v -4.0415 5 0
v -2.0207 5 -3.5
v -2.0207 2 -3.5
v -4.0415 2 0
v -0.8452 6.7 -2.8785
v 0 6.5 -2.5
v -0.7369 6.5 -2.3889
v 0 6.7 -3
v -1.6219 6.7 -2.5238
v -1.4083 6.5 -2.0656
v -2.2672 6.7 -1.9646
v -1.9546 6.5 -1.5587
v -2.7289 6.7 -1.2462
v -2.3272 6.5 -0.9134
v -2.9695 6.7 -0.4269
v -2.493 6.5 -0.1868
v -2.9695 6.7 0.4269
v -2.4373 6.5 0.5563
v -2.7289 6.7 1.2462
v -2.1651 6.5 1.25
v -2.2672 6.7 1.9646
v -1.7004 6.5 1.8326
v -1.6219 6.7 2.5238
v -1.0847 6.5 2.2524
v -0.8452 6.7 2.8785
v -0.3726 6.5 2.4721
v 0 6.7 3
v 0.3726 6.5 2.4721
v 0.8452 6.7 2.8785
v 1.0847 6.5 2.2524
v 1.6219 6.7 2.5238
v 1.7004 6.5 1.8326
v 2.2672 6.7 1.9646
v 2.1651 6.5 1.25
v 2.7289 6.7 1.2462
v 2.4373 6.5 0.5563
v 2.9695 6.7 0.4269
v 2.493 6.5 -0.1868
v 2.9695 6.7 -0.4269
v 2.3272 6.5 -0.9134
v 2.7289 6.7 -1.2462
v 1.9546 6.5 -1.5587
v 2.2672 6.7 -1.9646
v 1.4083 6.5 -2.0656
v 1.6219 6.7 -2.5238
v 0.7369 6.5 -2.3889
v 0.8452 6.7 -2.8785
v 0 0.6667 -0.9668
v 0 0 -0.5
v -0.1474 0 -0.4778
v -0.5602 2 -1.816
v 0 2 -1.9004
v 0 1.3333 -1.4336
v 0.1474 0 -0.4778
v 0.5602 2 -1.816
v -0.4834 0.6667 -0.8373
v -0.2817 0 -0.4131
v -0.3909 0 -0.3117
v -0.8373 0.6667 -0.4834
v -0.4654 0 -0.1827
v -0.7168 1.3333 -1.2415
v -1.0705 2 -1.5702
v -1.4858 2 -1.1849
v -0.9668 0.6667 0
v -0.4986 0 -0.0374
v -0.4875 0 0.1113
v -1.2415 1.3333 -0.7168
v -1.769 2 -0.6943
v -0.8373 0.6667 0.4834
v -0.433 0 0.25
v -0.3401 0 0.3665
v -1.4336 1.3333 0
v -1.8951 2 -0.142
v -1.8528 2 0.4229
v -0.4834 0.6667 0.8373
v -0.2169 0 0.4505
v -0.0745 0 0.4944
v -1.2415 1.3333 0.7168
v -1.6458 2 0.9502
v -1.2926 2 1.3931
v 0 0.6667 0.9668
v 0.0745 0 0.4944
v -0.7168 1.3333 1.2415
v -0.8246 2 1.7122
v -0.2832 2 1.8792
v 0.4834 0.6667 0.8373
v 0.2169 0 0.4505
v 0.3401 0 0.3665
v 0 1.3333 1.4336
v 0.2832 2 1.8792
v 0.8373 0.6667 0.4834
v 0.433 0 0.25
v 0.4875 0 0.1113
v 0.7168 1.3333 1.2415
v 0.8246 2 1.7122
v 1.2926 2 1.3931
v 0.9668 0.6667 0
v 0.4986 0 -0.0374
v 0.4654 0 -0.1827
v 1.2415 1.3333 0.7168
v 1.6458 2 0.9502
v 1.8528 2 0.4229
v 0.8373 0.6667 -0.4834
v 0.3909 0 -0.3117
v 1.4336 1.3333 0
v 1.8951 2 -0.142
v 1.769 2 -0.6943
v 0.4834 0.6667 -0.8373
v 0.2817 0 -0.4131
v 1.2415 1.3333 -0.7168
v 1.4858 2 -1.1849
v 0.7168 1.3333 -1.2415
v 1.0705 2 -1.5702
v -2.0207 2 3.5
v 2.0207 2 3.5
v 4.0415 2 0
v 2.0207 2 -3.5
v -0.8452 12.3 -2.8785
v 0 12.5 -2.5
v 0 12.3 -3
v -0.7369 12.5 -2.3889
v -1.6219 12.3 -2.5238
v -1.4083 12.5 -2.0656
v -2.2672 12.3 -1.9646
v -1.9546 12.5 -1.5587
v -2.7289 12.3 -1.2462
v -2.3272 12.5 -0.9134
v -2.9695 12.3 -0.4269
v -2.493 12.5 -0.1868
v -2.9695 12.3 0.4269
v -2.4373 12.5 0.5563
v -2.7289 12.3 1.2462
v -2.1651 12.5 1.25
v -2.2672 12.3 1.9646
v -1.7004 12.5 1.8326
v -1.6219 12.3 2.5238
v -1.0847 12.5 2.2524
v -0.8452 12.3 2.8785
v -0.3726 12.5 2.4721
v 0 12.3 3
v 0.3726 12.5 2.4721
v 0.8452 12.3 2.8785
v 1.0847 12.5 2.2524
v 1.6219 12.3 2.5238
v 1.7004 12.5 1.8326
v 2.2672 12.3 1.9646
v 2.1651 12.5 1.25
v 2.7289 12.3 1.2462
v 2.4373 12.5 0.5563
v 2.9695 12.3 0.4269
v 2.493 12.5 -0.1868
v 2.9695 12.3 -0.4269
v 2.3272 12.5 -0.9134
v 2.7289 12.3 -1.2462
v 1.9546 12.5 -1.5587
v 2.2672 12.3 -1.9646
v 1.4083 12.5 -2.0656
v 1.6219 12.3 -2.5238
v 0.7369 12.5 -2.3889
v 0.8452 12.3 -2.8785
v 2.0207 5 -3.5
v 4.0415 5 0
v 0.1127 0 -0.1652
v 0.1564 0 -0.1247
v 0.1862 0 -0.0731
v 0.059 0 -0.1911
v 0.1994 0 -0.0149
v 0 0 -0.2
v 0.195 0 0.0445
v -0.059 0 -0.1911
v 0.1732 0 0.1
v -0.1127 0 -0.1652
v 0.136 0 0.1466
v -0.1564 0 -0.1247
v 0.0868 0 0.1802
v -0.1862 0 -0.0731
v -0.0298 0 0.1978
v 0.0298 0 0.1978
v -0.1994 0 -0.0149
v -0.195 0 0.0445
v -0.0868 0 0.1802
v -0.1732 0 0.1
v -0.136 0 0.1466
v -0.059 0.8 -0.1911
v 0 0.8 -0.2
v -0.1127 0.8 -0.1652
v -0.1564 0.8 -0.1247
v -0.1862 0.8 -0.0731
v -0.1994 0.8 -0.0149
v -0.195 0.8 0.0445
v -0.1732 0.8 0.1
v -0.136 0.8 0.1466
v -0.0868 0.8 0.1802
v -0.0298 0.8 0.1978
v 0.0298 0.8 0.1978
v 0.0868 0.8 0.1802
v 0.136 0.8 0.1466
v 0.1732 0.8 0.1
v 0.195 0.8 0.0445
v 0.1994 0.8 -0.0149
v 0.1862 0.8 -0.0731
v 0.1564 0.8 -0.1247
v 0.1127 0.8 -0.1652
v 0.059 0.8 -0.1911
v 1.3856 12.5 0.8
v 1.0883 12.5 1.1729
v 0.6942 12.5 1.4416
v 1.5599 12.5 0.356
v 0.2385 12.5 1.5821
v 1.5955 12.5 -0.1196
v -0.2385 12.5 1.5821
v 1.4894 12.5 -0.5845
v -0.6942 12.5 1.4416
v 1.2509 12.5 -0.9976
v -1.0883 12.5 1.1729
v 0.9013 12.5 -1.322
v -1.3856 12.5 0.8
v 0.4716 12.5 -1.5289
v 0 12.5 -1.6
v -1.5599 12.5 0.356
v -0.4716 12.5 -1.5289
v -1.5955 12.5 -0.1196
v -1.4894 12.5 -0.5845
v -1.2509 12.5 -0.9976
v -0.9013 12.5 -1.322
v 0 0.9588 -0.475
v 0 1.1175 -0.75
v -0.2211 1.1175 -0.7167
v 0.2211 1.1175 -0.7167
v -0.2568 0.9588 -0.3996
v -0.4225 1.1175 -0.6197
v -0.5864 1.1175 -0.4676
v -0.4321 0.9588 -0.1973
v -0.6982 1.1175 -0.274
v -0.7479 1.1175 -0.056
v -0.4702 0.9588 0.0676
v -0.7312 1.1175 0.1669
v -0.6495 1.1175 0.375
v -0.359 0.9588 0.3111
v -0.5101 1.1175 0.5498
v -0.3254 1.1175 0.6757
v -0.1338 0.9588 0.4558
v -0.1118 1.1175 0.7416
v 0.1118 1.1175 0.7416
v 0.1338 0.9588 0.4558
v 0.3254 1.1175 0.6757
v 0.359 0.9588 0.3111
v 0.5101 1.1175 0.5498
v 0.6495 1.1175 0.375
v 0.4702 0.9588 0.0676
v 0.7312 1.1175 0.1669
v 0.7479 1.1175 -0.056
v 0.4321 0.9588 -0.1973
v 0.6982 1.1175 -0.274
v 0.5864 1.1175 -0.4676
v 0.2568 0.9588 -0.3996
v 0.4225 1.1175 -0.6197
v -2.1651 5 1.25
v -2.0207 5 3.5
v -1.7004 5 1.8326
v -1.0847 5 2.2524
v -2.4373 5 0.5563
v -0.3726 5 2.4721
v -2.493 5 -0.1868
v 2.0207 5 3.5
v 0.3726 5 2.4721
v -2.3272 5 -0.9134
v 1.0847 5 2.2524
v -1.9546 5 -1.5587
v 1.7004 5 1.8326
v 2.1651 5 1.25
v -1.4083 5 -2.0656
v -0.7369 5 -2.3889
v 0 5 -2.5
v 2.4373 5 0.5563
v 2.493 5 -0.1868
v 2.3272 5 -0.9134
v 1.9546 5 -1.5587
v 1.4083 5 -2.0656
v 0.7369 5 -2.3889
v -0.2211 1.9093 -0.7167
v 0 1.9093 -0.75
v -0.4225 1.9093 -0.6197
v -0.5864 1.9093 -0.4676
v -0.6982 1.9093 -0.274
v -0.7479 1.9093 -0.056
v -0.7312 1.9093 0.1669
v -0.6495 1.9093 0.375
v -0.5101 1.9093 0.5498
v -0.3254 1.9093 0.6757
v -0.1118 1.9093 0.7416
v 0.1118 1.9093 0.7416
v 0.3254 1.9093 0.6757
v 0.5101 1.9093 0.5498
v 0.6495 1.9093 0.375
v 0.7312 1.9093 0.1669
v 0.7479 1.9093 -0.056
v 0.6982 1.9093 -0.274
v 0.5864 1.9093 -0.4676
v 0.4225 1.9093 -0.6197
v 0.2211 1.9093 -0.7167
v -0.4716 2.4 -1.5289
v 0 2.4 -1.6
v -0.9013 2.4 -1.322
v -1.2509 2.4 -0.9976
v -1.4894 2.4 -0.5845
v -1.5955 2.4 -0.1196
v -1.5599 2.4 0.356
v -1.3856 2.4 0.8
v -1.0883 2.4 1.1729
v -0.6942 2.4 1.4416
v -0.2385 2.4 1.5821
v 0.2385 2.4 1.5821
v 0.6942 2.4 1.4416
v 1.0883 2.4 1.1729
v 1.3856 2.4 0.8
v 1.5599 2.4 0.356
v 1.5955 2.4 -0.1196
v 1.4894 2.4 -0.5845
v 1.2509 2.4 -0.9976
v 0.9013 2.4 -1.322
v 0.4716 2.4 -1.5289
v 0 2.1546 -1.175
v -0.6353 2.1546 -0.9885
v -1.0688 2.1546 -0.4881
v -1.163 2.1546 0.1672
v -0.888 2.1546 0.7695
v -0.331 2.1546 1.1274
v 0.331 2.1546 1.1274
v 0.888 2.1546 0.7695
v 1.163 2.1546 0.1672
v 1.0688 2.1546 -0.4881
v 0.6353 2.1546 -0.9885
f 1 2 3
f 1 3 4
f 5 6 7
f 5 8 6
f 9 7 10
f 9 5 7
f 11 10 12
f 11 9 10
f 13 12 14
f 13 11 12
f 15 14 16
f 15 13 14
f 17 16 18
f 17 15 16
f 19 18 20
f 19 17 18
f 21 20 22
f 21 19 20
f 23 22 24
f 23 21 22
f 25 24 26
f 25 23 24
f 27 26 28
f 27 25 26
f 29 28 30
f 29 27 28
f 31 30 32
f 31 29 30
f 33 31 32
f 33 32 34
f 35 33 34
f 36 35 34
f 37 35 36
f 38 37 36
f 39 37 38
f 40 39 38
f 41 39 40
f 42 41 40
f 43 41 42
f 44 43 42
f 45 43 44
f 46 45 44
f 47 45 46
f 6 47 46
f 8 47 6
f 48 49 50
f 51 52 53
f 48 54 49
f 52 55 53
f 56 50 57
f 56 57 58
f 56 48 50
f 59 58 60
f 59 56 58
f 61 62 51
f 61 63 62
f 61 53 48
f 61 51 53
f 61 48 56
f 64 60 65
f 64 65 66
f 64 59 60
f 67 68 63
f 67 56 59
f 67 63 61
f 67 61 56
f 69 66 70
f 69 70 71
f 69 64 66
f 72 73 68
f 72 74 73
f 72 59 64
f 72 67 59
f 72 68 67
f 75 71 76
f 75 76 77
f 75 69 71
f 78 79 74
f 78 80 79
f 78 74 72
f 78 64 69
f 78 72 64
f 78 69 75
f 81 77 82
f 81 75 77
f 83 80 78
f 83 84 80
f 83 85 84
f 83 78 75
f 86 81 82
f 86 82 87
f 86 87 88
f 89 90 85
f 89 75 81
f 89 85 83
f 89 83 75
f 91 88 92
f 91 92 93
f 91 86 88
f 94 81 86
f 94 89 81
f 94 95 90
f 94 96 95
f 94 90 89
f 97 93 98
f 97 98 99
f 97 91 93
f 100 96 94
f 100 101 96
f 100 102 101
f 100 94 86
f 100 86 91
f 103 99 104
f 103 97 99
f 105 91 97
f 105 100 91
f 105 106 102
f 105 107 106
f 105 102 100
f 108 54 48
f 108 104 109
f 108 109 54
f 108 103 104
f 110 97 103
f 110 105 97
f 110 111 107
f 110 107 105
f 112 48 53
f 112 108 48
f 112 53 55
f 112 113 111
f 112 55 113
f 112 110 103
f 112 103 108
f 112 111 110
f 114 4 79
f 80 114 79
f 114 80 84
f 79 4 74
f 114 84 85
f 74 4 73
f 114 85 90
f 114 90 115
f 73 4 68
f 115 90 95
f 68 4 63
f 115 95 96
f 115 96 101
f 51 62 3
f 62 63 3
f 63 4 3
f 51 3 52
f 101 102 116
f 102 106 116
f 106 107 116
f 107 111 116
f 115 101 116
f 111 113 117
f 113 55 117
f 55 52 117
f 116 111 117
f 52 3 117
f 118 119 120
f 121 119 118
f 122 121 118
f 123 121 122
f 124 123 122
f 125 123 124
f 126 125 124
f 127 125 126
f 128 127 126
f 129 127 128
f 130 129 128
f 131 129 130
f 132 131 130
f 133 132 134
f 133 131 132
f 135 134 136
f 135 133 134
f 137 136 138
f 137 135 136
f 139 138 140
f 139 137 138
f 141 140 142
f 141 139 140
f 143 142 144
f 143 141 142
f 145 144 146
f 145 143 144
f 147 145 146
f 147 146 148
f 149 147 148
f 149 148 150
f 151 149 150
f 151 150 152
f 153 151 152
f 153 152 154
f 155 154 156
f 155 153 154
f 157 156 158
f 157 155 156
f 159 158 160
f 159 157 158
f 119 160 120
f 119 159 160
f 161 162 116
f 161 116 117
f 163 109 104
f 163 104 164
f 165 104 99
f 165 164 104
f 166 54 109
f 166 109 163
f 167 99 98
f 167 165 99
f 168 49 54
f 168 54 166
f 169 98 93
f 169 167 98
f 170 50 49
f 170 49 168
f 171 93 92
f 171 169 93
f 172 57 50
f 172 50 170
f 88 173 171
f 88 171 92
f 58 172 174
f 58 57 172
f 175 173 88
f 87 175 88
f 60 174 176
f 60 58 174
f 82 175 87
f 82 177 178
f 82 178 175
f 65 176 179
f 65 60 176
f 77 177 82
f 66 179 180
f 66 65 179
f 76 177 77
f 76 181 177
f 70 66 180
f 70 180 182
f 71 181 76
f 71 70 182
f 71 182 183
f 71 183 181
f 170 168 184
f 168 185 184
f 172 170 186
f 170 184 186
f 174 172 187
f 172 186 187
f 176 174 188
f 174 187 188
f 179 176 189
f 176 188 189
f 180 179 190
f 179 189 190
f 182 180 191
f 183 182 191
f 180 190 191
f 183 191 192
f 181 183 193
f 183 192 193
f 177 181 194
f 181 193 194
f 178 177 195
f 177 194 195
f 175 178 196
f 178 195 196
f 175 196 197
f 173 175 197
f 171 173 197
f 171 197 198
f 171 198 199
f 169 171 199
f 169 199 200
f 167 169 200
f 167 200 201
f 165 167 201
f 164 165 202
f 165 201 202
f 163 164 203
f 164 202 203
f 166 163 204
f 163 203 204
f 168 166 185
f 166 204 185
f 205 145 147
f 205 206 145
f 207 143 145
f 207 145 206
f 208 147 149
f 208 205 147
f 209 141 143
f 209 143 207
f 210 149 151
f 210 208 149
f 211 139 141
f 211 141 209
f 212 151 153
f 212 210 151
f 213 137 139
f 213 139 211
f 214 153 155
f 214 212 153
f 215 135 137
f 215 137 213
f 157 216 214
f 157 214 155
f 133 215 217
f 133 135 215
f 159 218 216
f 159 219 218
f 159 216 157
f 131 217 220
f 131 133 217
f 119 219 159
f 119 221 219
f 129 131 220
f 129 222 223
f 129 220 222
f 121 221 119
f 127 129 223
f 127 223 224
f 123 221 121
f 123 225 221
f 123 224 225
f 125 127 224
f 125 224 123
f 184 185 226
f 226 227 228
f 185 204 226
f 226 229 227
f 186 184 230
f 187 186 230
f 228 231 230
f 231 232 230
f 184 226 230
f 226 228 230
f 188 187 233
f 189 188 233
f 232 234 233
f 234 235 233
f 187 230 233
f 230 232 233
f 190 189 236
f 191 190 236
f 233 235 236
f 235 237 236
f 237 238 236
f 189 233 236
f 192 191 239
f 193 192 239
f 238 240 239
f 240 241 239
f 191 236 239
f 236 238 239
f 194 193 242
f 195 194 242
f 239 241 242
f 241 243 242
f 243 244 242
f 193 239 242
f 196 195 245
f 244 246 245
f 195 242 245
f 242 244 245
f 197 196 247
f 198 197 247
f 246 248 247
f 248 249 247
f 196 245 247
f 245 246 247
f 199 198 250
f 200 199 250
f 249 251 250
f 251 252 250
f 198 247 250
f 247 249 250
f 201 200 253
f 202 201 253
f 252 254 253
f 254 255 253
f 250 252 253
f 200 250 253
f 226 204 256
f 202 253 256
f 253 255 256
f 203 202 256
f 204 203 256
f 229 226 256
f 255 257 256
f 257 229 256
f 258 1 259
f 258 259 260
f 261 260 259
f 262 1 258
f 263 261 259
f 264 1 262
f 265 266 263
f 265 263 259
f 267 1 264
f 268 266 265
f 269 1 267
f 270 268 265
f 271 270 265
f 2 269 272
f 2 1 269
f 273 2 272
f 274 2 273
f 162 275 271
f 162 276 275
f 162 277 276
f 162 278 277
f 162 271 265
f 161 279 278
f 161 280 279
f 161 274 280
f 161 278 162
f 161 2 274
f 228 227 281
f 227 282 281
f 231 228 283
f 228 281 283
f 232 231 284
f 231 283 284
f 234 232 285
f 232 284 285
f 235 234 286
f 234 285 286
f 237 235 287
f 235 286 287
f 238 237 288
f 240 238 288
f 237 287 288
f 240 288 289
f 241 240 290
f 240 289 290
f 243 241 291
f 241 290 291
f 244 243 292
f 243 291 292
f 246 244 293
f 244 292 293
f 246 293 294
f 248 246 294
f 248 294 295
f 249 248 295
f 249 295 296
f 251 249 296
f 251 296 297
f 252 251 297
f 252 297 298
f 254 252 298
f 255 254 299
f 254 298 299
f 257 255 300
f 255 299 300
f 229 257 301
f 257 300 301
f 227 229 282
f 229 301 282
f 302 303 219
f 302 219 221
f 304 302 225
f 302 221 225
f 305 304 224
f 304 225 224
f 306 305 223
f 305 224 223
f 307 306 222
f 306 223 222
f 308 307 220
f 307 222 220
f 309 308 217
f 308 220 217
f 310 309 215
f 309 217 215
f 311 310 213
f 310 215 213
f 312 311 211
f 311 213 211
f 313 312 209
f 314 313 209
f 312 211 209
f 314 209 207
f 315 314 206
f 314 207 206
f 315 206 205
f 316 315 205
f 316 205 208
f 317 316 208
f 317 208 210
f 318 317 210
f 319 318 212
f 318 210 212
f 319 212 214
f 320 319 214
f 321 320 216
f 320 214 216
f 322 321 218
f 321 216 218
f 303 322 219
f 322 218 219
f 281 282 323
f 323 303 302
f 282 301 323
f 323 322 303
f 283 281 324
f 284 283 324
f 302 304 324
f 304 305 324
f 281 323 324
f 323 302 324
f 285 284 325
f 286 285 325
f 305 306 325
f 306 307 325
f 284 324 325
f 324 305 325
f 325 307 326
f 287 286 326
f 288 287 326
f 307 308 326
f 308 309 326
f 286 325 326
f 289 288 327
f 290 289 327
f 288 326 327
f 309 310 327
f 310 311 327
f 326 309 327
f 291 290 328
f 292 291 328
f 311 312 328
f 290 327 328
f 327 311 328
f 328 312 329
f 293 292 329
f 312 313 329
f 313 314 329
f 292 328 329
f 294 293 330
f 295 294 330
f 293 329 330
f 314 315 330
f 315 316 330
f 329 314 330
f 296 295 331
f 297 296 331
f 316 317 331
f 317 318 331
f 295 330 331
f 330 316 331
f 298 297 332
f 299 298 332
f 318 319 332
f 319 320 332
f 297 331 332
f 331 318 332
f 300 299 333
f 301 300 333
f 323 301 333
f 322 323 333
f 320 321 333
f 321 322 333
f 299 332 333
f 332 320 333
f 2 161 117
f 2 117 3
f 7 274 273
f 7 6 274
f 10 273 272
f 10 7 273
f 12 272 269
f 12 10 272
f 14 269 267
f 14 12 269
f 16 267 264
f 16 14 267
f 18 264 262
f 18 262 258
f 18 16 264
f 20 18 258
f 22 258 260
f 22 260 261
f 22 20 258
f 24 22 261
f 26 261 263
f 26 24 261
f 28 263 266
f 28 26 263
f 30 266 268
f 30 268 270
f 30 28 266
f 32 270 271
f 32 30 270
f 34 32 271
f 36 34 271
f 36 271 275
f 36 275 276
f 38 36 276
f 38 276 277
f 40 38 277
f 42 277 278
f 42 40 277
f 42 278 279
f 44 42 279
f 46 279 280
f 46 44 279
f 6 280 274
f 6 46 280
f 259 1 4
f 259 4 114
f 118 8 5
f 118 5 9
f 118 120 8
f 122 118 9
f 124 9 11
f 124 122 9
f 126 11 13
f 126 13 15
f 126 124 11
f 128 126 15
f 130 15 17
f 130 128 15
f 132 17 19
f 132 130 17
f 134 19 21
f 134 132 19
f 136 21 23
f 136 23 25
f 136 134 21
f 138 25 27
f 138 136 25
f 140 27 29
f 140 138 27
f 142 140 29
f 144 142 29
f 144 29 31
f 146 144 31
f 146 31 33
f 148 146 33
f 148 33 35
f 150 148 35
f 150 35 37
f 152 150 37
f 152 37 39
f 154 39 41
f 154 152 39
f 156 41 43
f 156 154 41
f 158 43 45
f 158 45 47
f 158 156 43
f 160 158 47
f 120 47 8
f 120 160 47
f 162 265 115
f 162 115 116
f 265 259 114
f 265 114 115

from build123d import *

# Parameters (mm, degrees)
BOSS_EXTRUDE1_DEPTH = 3


with BuildPart() as part:
    # Sketch1 → Revolve1 (revolve)
    with BuildSketch(Plane.XY, mode=Mode.PRIVATE) as revolve1_sk:
        Polygon((0, 0), (0.5, 0), (1.900415076, 2), (3.5, 2), (3.5, 5), (2.5, 5), (2.5, 6.5), (3, 6.7), (3, 12.3), (2.5, 12.5), (0, 12.5), align=None)
    revolve(revolve1_sk.sketch.rotate(Axis((0, 0, 0), (0, 1, 0)), 90), axis=Axis((0, 0, 0), (0, 1, 0)))

    # Sketch2 → Boss-Extrude1 (add)
    with BuildSketch(Plane(origin=(0, 5, 0), x_dir=(1, 0, 0), z_dir=(0, 1, 0))):
        Polygon((2.020725942, 3.5), (-2.020725942, 3.5), (-4.041451884, 0), (-2.020725942, -3.5), (2.020725942, -3.5), (4.041451884, 0), align=None)
    extrude(amount=-BOSS_EXTRUDE1_DEPTH)

    # Sketch3 → Cut-Revolve1 (revolve, cut)
    with BuildSketch(Plane.XY, mode=Mode.PRIVATE) as cut_revolve1_sk:
        Polygon((0, 0), (0.2, 0), (0.2, 0.8), (0.75, 1.117542648), (0.75, 1.909252271), (1.6, 2.4), (1.6, 12.5), (0, 12.5), align=None)
    revolve(cut_revolve1_sk.sketch.rotate(Axis((0, 0, 0), (0, 1, 0)), 90), axis=Axis((0, 0, 0), (0, 1, 0)), mode=Mode.SUBTRACT)


solid = part.part
